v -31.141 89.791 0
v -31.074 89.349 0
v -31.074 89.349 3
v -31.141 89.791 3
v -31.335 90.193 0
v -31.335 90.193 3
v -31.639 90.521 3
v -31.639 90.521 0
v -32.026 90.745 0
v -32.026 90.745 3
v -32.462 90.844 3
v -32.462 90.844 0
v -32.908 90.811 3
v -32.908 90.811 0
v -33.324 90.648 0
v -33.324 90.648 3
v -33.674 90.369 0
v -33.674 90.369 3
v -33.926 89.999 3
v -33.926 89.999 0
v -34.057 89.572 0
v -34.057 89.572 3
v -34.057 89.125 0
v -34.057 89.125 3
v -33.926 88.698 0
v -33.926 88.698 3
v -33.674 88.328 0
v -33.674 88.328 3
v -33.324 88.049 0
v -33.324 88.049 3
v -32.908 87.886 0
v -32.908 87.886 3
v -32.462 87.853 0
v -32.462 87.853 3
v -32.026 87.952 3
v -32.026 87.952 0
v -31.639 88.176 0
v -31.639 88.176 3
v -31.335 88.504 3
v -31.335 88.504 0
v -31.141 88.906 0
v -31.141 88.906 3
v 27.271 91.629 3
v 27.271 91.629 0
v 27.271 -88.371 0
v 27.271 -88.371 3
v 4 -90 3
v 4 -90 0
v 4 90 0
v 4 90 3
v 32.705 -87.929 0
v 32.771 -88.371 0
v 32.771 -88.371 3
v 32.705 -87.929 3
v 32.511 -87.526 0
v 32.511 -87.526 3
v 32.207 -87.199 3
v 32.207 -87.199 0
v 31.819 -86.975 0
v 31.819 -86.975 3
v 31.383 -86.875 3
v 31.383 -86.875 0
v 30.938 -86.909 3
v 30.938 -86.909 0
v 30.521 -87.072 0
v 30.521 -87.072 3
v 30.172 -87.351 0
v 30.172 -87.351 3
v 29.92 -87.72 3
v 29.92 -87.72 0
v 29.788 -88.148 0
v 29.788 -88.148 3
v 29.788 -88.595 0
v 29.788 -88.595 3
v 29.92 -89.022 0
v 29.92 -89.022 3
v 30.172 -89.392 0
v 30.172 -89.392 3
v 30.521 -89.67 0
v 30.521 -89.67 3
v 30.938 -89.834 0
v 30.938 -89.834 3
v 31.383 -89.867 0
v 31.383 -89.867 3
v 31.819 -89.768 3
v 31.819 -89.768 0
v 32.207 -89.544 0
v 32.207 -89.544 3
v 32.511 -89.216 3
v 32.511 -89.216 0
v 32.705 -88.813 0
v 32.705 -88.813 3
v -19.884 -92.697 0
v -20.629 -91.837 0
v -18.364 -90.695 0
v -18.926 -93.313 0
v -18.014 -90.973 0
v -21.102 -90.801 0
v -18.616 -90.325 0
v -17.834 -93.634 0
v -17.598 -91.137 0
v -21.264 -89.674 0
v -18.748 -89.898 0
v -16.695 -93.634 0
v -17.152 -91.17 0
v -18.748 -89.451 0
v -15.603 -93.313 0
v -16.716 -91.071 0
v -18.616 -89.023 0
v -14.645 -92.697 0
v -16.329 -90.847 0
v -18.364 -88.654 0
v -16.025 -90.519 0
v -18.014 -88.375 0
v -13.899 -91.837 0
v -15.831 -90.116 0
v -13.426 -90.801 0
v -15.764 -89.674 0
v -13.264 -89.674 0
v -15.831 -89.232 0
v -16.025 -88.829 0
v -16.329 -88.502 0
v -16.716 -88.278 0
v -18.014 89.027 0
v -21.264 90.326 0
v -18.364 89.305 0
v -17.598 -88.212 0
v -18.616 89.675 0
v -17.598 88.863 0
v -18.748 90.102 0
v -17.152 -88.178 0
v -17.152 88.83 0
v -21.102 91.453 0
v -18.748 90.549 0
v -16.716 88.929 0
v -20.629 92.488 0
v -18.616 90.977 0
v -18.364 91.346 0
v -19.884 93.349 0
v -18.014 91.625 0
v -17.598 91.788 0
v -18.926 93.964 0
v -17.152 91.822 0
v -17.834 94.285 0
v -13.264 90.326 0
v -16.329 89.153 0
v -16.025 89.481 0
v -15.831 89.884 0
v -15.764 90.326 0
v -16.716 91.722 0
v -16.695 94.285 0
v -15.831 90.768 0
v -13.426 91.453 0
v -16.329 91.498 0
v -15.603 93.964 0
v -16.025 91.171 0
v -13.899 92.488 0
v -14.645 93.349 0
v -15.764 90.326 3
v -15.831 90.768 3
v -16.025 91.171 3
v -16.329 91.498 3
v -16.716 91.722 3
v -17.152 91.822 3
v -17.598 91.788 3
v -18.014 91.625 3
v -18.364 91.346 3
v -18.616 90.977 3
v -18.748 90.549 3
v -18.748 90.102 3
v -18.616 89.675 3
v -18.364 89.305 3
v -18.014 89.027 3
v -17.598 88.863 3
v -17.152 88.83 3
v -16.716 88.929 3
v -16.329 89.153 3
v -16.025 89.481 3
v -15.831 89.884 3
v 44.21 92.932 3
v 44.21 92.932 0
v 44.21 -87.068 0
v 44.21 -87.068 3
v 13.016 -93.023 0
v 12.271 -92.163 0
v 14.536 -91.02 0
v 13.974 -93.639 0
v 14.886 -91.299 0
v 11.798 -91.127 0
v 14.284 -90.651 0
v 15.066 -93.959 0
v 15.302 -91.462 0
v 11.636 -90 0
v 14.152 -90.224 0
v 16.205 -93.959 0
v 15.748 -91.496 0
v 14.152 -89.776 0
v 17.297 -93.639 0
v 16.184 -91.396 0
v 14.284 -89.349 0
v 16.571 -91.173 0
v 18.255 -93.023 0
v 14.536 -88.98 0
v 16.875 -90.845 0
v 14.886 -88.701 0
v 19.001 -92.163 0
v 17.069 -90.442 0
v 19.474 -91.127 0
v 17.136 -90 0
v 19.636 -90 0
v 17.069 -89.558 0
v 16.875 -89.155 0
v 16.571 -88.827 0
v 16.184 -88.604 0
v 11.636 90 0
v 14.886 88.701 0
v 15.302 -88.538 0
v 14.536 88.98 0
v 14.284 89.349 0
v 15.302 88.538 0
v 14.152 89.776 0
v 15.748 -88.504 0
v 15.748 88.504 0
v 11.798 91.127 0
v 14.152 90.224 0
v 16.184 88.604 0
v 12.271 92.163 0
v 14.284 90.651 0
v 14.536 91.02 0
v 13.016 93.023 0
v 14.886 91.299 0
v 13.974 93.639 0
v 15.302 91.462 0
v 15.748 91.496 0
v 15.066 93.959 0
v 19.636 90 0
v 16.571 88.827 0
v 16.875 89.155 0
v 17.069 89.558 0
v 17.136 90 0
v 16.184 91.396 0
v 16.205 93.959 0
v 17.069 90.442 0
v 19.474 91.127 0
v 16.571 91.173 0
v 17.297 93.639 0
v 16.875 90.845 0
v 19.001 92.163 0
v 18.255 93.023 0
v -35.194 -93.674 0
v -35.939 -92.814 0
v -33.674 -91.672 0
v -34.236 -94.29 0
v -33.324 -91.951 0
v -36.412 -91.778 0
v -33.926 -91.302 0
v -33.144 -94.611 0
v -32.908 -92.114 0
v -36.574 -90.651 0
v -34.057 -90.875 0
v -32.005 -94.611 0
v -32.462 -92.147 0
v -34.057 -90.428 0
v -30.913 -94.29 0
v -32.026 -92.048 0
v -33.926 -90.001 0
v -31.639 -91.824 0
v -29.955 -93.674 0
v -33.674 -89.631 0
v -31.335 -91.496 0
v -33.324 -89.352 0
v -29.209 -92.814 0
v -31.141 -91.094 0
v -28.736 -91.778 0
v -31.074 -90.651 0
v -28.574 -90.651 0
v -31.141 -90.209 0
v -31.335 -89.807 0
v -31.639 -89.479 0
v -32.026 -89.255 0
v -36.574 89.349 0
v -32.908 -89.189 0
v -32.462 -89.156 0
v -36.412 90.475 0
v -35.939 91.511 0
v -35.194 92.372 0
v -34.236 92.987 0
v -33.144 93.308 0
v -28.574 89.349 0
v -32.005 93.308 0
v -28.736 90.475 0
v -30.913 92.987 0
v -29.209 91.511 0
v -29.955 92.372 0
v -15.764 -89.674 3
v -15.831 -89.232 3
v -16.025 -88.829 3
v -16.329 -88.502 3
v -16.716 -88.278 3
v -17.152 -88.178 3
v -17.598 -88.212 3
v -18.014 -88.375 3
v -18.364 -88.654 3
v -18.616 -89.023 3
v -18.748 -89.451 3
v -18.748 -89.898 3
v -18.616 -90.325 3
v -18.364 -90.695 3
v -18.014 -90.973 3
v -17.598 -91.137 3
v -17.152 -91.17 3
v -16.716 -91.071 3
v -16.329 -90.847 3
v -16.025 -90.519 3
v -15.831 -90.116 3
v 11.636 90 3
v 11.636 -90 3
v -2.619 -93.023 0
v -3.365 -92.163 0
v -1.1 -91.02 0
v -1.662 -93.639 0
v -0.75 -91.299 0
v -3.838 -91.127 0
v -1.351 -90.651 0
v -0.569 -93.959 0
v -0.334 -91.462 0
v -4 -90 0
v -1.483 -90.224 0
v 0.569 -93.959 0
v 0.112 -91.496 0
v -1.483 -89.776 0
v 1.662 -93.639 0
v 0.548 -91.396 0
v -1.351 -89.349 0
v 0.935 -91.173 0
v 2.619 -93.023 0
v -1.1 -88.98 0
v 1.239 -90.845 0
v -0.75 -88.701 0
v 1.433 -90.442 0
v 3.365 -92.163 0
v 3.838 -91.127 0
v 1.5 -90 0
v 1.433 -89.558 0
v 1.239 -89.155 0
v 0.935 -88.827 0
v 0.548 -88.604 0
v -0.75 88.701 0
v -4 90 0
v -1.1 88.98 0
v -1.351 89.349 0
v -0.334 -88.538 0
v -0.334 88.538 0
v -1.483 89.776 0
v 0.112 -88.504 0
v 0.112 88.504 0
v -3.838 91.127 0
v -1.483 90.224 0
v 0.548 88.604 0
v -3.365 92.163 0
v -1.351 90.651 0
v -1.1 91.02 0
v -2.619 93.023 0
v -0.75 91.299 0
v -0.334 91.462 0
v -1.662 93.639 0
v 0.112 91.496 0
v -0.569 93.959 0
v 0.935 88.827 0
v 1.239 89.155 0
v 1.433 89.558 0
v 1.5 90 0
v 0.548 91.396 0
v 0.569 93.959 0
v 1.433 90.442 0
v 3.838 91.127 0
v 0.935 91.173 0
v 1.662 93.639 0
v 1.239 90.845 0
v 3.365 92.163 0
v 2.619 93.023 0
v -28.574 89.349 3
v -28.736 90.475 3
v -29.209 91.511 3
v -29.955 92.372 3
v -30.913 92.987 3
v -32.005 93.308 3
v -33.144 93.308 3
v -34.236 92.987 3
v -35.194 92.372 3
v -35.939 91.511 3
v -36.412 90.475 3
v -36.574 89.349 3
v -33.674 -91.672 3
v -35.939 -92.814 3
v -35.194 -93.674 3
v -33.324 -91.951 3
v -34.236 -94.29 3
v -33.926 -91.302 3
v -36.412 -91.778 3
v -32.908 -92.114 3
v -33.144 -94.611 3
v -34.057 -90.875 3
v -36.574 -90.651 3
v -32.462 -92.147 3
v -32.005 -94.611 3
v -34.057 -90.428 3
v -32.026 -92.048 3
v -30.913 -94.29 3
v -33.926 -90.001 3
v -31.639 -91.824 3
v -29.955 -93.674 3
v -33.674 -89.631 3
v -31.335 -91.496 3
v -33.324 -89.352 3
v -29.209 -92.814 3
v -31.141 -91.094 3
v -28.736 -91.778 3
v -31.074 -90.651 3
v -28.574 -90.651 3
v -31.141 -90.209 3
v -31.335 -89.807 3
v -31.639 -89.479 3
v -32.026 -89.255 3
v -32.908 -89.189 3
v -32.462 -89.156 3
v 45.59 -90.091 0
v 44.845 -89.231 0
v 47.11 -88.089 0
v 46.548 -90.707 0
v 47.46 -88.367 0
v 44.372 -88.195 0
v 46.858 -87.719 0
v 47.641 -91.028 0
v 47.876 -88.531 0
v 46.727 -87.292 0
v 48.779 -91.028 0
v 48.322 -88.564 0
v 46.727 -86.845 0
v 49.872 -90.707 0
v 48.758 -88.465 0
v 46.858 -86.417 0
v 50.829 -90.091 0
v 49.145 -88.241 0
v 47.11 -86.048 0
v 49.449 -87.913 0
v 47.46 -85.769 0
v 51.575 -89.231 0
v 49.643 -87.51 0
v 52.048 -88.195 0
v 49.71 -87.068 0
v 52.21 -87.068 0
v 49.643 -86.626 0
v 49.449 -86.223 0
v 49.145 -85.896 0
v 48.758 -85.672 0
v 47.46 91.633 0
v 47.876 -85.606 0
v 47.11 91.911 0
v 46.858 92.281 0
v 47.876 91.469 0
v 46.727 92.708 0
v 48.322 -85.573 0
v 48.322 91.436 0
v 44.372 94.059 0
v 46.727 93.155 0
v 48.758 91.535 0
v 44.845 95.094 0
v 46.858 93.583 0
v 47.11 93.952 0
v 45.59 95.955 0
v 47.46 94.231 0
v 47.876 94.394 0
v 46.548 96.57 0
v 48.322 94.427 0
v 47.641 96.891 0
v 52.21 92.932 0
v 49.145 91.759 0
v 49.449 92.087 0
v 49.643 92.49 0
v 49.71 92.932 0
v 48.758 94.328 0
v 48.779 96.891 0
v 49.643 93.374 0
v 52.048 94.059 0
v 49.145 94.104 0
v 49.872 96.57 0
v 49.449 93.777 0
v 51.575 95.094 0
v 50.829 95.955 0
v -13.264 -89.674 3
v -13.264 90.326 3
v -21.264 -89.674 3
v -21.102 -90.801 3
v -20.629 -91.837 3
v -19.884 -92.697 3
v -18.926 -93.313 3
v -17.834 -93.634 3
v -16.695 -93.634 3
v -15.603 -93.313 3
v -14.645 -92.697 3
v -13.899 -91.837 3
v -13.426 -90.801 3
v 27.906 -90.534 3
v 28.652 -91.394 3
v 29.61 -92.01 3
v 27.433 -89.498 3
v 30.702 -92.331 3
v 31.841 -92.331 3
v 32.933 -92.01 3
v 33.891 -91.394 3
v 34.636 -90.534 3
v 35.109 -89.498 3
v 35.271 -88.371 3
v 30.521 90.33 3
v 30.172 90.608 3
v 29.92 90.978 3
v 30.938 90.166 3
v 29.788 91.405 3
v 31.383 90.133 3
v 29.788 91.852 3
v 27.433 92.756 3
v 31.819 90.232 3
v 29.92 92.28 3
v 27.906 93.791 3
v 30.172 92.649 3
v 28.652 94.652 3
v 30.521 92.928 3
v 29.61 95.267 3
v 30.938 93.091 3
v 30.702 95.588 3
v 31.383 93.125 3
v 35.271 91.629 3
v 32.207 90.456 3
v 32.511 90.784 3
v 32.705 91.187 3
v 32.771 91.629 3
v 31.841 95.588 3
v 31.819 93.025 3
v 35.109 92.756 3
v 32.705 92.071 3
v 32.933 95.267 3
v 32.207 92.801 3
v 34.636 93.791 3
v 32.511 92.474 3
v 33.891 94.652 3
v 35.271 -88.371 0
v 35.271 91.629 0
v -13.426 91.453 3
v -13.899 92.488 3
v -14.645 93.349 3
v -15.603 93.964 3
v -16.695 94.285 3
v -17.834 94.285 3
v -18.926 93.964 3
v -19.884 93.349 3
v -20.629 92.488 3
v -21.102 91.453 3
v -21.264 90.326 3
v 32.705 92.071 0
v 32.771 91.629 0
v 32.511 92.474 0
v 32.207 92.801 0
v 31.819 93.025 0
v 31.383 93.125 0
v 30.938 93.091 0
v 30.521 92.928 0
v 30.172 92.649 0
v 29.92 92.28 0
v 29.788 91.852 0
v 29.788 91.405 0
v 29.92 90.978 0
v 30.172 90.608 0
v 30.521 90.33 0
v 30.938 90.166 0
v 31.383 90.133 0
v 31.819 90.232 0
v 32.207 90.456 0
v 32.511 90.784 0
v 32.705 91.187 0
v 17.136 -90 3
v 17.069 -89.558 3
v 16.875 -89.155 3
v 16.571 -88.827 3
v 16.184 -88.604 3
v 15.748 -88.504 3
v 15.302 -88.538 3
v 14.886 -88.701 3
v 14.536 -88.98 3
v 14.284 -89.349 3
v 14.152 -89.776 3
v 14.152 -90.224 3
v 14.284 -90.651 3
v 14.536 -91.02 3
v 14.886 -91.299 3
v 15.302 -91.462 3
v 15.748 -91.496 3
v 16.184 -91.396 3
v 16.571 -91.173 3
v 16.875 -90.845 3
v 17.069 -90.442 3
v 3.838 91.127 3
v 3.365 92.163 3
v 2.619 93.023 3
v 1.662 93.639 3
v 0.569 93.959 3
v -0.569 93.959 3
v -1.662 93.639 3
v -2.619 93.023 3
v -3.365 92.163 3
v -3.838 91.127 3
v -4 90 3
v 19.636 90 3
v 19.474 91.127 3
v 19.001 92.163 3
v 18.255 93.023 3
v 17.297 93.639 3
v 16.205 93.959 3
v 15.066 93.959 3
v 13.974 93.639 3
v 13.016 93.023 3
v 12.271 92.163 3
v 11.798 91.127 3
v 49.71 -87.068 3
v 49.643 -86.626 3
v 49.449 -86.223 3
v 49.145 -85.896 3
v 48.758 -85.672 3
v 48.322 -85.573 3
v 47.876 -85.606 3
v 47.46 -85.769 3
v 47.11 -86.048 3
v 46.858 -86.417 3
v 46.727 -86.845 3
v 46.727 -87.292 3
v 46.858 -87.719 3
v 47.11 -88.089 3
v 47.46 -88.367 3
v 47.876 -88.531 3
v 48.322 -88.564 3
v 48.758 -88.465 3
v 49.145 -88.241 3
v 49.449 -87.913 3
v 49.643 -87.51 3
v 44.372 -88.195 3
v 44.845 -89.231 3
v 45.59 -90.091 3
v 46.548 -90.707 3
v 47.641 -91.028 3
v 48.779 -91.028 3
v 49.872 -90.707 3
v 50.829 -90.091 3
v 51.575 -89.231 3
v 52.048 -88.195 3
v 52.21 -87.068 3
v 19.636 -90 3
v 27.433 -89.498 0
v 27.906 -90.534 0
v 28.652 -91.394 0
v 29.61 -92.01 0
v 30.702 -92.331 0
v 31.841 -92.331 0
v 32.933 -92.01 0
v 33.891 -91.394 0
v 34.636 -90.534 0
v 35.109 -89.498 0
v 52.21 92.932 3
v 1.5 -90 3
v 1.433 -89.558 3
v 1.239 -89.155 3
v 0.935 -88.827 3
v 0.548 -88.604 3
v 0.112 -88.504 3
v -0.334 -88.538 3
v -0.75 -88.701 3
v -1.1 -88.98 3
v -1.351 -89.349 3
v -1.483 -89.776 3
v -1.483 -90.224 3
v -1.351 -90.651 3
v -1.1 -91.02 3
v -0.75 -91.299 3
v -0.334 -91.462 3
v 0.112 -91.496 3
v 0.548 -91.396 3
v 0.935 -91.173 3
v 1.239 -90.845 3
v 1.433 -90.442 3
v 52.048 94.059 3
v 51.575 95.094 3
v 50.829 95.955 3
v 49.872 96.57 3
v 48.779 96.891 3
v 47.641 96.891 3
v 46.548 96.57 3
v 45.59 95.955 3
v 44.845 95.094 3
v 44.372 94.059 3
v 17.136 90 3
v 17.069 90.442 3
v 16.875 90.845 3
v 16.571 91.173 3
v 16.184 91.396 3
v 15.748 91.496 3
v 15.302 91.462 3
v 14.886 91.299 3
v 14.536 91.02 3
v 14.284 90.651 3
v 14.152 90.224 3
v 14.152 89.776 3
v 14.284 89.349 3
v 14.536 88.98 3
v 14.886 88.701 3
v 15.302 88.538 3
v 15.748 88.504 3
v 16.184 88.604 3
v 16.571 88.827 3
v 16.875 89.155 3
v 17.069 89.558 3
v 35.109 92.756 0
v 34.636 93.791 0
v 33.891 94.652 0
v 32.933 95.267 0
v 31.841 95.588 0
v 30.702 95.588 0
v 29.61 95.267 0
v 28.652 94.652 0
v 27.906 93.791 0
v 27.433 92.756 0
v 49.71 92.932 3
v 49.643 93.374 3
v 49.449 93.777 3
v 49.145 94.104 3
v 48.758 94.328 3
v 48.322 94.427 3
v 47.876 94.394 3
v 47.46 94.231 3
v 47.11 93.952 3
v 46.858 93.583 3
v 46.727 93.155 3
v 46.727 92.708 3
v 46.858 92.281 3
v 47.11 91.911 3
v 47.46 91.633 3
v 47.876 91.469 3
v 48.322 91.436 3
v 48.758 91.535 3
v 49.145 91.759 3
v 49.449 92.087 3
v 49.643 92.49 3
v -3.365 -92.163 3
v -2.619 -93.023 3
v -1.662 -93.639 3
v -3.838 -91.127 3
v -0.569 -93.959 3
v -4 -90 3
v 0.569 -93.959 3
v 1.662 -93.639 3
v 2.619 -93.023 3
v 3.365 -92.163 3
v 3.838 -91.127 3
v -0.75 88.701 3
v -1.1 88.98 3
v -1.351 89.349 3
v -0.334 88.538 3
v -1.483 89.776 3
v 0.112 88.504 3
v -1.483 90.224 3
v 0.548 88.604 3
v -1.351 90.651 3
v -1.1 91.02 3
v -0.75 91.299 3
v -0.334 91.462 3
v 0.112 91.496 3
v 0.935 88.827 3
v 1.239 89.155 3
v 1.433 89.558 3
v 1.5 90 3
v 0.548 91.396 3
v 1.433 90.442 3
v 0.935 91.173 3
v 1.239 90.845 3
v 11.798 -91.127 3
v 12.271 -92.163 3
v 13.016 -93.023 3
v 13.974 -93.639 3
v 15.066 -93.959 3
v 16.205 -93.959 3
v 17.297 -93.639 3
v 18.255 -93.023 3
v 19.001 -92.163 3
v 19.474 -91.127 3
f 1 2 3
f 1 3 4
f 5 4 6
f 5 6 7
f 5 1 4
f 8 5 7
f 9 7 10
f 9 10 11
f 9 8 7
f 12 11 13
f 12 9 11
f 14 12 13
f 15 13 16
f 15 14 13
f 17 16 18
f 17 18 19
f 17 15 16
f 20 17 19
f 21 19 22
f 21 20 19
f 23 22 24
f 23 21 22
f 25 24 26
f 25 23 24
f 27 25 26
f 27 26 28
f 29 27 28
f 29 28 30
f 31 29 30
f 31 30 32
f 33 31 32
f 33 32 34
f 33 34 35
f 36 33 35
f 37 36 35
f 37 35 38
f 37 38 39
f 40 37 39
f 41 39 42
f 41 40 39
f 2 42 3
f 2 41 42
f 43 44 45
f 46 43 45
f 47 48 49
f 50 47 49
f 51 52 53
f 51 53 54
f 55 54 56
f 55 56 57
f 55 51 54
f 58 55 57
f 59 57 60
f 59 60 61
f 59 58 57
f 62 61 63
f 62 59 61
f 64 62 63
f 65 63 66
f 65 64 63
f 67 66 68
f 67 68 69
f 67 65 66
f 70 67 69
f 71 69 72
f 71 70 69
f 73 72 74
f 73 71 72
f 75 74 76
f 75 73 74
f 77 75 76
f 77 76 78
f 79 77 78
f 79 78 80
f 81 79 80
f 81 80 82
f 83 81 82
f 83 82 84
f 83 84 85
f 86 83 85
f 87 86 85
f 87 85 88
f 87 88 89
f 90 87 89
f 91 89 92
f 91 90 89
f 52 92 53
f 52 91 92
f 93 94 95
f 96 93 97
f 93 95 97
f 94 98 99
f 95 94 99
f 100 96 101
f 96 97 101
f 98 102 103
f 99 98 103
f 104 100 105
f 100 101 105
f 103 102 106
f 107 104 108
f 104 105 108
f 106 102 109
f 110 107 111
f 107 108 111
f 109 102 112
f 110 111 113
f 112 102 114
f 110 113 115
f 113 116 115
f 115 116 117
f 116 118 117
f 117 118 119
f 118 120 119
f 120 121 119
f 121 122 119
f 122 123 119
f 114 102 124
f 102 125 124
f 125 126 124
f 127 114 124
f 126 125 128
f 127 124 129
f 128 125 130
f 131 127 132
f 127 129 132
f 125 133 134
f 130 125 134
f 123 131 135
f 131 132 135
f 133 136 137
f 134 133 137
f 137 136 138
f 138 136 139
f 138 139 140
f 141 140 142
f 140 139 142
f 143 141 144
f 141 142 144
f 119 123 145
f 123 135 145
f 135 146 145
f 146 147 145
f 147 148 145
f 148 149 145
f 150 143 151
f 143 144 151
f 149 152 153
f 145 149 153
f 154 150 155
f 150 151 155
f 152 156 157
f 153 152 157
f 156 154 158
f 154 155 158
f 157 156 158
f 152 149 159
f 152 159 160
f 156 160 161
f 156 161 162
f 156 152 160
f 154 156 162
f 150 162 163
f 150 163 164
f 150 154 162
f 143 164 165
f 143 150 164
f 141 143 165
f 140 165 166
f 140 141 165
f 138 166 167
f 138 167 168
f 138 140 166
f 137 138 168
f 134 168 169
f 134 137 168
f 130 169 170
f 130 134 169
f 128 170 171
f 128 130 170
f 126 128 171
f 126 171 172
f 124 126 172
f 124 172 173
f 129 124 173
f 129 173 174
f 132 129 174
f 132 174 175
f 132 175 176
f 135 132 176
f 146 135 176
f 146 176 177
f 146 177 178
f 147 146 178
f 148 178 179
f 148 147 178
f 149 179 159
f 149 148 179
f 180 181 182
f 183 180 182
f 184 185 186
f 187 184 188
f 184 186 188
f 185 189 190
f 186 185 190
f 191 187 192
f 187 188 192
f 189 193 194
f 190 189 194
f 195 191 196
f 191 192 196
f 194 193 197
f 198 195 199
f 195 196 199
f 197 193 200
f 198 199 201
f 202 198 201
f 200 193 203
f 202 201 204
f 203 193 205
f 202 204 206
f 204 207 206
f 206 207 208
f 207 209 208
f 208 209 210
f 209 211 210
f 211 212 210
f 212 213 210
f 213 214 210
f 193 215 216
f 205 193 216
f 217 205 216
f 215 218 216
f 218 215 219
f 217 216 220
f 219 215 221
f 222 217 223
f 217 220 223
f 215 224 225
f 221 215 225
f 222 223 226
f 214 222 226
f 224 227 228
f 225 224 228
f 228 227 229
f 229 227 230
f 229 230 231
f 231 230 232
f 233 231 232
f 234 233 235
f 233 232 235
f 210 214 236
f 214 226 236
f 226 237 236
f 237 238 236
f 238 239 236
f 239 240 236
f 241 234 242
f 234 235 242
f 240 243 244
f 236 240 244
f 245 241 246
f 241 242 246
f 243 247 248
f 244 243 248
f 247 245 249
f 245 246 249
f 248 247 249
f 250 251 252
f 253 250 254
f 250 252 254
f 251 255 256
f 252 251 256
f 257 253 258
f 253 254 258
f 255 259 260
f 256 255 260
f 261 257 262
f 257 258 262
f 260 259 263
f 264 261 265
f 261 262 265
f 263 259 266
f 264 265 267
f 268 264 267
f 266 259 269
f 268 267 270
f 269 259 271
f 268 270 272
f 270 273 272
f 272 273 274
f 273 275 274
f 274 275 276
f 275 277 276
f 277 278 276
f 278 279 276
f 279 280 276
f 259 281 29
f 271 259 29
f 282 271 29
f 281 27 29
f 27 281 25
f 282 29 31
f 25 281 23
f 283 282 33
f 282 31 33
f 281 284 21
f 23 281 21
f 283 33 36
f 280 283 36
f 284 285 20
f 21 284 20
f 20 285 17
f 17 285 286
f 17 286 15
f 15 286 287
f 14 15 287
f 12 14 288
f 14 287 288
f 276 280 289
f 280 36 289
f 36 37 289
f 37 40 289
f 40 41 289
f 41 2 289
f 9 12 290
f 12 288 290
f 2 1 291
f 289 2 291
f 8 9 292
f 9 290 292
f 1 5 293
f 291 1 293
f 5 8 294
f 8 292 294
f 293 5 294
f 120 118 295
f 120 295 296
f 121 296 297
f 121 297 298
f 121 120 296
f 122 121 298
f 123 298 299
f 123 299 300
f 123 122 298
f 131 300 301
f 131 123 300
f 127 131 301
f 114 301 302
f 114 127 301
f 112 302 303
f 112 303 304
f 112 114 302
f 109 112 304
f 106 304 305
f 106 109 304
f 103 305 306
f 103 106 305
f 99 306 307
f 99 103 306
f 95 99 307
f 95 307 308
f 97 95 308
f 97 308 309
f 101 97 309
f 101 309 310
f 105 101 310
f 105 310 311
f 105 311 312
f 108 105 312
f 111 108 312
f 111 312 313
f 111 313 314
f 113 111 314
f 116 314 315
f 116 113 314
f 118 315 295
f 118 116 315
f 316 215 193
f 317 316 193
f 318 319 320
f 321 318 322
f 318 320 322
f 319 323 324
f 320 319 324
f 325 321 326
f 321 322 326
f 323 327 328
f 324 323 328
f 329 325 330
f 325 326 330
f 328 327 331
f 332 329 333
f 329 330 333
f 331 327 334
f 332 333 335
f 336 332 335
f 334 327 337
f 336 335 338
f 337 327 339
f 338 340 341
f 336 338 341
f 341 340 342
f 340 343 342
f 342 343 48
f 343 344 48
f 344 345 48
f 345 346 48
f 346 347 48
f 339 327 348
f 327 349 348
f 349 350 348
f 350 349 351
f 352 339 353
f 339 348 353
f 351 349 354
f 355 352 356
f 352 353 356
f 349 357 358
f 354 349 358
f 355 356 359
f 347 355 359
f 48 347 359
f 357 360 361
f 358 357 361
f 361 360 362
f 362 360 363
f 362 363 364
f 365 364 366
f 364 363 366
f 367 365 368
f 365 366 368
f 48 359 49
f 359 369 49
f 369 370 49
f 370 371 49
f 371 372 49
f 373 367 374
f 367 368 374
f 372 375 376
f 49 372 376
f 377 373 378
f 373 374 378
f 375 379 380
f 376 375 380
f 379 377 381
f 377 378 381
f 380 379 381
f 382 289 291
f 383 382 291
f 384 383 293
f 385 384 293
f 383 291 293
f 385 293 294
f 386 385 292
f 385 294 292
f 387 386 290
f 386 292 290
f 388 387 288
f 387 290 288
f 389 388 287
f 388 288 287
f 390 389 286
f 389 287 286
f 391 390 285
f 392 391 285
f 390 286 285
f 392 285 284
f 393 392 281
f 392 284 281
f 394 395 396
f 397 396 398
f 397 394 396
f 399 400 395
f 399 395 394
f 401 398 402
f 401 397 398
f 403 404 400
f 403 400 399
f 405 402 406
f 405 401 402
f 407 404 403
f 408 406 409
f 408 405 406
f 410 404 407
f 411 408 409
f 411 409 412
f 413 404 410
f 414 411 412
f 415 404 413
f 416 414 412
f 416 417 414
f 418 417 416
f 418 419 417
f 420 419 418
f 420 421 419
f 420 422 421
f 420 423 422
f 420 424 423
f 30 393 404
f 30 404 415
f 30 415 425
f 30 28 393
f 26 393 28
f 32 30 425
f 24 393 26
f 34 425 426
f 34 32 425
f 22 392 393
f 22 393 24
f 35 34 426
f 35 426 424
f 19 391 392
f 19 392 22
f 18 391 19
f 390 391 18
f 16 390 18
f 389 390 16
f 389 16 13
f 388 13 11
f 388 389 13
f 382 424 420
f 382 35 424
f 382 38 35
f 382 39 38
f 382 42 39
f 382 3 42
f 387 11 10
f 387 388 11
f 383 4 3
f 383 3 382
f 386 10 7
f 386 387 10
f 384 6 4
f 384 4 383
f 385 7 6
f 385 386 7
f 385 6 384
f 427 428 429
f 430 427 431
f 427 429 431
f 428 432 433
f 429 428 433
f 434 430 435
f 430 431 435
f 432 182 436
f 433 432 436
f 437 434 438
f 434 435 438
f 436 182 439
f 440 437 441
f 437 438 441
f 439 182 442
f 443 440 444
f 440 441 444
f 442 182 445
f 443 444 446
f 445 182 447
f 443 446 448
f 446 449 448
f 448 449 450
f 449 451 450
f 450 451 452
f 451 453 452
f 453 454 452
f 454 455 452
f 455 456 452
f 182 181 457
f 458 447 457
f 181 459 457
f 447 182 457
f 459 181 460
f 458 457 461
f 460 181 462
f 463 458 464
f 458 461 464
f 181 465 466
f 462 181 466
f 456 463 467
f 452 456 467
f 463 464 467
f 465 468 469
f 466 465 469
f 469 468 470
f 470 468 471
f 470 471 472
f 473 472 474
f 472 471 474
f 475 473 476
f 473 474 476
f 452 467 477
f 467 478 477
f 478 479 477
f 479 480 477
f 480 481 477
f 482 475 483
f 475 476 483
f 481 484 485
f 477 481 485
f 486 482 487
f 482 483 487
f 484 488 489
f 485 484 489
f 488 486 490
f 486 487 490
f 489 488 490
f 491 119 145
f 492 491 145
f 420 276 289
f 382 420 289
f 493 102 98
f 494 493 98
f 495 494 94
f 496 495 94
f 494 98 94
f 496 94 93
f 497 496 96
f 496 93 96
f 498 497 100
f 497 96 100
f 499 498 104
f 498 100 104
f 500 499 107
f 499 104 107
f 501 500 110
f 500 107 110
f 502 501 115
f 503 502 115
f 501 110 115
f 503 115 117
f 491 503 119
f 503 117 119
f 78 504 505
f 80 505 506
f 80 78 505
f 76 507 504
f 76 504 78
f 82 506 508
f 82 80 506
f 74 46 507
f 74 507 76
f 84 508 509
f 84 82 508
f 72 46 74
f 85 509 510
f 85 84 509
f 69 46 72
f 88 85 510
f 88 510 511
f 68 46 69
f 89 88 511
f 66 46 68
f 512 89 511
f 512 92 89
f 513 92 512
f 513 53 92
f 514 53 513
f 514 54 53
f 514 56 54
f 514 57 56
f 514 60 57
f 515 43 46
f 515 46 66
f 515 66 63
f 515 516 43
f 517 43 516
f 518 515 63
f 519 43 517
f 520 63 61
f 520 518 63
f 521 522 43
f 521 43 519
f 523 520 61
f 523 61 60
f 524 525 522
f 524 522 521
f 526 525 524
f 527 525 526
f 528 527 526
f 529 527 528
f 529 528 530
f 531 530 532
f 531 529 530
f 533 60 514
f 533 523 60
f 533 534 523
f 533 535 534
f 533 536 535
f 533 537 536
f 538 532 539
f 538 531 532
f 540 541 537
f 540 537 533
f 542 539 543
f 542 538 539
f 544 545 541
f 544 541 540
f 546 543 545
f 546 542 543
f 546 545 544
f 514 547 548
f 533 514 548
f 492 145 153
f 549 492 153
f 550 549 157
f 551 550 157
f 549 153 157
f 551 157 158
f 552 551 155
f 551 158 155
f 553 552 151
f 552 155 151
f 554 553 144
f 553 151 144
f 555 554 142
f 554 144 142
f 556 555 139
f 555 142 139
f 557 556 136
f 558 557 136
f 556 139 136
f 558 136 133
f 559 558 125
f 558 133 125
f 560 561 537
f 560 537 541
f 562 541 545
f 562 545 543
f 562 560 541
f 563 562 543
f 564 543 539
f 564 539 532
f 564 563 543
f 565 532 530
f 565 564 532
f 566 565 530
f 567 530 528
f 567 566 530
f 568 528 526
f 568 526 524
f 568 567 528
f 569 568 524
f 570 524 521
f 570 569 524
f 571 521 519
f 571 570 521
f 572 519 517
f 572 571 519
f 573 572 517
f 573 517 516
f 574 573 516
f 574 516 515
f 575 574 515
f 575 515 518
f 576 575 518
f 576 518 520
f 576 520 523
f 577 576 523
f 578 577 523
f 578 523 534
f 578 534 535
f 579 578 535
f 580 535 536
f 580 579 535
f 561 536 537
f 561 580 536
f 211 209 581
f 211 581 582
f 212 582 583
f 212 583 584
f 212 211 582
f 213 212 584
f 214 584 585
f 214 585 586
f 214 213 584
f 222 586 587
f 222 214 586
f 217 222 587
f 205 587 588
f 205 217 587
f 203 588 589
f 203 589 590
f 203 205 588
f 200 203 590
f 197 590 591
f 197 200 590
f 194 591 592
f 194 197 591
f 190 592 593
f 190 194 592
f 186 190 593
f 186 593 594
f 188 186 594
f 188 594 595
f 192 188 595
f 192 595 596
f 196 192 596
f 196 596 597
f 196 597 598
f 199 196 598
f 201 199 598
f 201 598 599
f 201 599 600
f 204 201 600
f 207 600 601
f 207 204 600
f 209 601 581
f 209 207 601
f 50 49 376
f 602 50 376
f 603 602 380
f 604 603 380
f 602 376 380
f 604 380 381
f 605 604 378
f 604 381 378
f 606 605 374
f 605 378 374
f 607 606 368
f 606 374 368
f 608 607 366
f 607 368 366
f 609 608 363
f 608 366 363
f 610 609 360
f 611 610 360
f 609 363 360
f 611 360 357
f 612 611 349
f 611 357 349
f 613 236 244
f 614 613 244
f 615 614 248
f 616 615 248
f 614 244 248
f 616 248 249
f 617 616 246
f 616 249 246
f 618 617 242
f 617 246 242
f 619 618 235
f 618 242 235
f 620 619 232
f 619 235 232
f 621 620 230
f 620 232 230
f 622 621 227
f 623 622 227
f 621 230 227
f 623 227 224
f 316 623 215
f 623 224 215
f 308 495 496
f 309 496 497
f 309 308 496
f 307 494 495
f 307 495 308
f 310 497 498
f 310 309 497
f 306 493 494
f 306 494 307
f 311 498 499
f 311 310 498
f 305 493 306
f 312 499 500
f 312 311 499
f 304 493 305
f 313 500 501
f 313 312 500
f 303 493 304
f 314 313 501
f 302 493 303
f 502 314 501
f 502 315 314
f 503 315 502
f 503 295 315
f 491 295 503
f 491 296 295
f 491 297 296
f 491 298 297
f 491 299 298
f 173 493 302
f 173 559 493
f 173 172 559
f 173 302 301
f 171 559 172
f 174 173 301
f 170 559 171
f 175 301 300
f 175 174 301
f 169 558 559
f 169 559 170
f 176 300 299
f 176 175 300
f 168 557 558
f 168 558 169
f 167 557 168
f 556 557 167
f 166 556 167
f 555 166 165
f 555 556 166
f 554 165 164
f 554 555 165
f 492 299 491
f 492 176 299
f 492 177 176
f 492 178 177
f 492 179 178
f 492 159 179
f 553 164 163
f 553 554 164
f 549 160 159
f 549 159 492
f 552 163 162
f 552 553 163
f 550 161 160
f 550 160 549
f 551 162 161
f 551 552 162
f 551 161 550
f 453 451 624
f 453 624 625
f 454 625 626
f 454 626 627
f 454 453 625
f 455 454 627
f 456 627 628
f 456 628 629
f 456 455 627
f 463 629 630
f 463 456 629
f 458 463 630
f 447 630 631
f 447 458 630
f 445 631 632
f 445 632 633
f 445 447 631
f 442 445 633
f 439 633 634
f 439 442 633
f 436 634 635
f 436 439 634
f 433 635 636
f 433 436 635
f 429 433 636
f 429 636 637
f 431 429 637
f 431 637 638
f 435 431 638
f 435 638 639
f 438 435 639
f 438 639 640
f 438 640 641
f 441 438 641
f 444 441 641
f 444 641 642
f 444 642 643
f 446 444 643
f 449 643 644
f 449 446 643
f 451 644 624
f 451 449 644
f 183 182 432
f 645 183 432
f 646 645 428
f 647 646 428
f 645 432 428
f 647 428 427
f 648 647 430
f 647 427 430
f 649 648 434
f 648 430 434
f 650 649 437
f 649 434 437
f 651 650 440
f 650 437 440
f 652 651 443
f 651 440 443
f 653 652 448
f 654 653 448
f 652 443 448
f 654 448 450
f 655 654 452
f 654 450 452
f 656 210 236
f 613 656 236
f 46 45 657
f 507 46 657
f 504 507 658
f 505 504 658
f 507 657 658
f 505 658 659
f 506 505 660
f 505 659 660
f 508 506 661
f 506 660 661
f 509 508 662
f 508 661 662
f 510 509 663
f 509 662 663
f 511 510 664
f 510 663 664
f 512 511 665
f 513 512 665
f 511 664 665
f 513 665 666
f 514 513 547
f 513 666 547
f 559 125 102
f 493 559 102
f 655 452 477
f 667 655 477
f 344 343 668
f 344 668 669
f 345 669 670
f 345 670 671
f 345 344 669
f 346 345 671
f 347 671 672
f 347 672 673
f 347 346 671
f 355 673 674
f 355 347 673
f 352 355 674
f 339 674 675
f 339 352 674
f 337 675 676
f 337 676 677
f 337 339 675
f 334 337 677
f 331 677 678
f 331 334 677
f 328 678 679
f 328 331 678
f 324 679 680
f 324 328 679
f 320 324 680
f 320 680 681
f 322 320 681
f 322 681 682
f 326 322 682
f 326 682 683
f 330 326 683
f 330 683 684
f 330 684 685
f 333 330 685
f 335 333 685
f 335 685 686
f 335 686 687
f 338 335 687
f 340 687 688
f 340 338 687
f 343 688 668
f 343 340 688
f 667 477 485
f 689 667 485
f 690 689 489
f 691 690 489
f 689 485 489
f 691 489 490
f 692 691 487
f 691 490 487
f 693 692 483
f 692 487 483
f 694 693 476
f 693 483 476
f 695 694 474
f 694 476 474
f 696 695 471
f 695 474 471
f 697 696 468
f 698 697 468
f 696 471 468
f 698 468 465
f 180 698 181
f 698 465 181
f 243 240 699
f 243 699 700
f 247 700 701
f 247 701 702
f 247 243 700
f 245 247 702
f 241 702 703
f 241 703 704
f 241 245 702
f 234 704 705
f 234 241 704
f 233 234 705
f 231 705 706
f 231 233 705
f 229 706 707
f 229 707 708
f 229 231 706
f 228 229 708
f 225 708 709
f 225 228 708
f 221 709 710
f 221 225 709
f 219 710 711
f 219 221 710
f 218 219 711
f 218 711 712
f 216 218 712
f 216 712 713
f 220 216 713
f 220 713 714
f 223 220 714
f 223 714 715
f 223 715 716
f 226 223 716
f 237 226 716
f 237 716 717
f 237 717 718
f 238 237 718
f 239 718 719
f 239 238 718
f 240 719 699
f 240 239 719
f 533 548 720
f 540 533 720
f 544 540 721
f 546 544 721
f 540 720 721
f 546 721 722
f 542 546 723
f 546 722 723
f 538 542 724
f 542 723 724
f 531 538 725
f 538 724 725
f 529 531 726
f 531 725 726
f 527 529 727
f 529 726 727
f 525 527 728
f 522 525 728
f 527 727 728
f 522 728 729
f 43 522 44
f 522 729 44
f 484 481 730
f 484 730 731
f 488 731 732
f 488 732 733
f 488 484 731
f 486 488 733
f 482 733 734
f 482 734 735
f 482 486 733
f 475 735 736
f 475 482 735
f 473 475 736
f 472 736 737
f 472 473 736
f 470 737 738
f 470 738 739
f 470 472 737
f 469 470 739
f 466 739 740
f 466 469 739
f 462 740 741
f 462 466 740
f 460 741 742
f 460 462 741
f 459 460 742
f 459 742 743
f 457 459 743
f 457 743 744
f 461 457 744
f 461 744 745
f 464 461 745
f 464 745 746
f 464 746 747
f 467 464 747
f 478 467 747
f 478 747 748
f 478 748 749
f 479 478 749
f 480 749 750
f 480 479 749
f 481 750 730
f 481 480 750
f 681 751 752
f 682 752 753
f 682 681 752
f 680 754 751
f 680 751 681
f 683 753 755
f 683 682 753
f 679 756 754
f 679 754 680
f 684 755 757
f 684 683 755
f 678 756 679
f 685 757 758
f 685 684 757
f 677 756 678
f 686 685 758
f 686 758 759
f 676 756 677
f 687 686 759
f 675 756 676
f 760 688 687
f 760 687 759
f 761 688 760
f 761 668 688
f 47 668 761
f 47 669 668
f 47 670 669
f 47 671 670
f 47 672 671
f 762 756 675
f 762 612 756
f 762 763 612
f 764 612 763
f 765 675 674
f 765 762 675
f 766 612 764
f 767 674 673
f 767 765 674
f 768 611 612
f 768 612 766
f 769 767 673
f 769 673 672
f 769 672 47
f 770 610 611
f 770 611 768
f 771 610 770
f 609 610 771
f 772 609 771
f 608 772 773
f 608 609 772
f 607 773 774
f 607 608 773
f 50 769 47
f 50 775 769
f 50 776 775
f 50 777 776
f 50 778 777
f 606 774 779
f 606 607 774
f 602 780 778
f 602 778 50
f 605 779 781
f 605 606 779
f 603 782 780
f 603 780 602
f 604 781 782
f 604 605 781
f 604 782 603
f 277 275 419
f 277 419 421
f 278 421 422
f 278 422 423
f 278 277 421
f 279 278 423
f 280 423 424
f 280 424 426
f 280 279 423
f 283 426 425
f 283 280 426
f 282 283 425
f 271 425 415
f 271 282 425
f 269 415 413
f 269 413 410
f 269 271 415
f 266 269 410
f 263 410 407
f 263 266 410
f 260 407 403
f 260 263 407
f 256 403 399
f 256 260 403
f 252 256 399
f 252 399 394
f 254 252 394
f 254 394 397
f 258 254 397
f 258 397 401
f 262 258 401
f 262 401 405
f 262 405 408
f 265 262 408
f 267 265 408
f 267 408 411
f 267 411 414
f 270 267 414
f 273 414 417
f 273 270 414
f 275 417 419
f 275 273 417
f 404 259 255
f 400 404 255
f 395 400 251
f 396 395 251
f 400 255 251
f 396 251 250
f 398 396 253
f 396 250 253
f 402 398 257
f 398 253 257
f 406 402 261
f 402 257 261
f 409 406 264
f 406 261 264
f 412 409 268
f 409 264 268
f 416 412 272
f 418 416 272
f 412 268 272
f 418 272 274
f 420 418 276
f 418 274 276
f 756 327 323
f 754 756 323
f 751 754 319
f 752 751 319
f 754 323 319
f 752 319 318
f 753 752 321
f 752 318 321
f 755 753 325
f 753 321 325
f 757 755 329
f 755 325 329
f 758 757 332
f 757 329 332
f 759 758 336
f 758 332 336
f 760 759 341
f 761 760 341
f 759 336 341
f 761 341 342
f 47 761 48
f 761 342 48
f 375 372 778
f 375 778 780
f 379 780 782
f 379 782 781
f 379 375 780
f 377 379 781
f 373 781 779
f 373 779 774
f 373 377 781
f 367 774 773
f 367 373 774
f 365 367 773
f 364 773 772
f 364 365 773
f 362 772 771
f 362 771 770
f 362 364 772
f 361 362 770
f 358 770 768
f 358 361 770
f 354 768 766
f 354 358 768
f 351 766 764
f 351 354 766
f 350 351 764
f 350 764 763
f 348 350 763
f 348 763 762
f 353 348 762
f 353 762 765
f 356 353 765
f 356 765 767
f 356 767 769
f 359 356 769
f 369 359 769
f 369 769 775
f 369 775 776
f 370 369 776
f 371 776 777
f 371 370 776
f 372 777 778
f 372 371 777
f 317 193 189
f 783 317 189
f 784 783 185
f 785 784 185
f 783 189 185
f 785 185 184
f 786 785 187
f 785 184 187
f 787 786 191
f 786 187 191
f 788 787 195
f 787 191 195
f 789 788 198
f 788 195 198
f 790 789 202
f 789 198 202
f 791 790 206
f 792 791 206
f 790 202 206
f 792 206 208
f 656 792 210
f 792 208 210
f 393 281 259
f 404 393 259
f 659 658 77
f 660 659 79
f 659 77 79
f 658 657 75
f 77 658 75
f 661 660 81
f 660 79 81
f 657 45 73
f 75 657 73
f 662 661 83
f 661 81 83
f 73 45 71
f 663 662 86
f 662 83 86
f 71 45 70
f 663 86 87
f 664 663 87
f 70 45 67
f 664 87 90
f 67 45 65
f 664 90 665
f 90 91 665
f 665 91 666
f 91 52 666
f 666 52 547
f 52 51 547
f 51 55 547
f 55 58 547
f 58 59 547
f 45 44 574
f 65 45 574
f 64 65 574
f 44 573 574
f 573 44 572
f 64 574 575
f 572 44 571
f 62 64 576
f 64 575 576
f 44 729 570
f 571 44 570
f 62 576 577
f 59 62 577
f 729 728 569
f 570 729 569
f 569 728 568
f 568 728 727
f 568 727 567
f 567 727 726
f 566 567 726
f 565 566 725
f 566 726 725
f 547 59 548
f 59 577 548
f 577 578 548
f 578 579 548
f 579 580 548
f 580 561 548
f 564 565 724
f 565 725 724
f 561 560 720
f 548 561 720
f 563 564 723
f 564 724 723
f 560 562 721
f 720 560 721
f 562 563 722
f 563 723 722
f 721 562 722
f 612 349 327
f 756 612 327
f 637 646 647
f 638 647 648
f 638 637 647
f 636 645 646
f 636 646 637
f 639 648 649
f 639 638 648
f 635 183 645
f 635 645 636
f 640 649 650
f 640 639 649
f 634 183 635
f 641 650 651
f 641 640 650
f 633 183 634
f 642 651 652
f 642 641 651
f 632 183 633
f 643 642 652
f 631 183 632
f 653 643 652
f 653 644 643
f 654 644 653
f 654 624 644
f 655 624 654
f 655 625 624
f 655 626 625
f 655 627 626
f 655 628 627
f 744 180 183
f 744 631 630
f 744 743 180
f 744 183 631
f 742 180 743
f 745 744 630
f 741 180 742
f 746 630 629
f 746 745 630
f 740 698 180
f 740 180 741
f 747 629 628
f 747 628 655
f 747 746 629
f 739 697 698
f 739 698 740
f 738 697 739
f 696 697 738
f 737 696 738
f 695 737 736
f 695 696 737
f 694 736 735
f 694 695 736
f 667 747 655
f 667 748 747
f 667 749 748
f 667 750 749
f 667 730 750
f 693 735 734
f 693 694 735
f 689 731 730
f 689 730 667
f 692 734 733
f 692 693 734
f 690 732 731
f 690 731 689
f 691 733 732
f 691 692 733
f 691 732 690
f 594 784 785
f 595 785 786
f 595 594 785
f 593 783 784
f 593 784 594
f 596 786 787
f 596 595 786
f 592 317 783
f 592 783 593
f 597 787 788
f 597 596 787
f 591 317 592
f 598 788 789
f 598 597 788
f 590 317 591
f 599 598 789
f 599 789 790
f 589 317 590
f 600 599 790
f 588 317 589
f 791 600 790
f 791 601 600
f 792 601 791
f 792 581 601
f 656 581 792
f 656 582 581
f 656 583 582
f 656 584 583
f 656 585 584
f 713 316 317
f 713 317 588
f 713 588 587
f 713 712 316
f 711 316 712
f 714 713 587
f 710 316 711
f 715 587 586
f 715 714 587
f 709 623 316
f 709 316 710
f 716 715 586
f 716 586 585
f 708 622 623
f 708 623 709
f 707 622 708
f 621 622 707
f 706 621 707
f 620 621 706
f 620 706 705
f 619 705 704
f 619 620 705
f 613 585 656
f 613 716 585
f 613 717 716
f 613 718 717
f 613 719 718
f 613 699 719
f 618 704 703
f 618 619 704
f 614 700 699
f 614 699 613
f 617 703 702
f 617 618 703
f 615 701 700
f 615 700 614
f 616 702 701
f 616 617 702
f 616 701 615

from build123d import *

# Parameters (mm, degrees)
F0_R     = 1.5
F1_DEPTH = 3


with BuildPart() as f1:
    # F0 (on Top) → F1 (new body)
    with BuildSketch(Plane.XY):
        with BuildLine():
            Line((-28.574253, -90.651485), (-28.574253, 89.348515))
            ThreePointArc((-28.574253, 89.348515), (-32.574253, 93.348515), (-36.574253, 89.348515))
            Line((-36.574253, 89.348515), (-36.574253, -90.651485))
            ThreePointArc((-36.574253, -90.651485), (-32.574253, -94.651485), (-28.574253, -90.651485))
        make_face()
        with Locations((-32.574253, -90.651485)):
            Circle(F0_R, mode=Mode.SUBTRACT)
        with Locations((-32.574253, 89.348515)):
            Circle(F0_R, mode=Mode.SUBTRACT)
        with BuildLine():
            Line((-13.264356, -89.674257), (-13.264356, 90.325743))
            ThreePointArc((-13.264356, 90.325743), (-17.264356, 94.325743), (-21.264356, 90.325743))
            Line((-21.264356, 90.325743), (-21.264356, -89.674257))
            ThreePointArc((-21.264356, -89.674257), (-17.264356, -93.674257), (-13.264356, -89.674257))
        make_face()
        with Locations((-17.264356, -89.674257)):
            Circle(F0_R, mode=Mode.SUBTRACT)
        with Locations((-17.264356, 90.325743)):
            Circle(F0_R, mode=Mode.SUBTRACT)
        with BuildLine():
            Line((4, -90), (4, 90))
            ThreePointArc((4, 90), (0, 94), (-4, 90))
            Line((-4, 90), (-4, -90))
            ThreePointArc((-4, -90), (0, -94), (4, -90))
        make_face()
        with Locations((0, -90)):
            Circle(F0_R, mode=Mode.SUBTRACT)
        with Locations((0, 90)):
            Circle(F0_R, mode=Mode.SUBTRACT)
        with BuildLine():
            Line((19.635641, -90), (19.635641, 90))
            ThreePointArc((19.635641, 90), (15.635641, 94), (11.635641, 90))
            Line((11.635641, 90), (11.635641, -90))
            ThreePointArc((11.635641, -90), (15.635641, -94), (19.635641, -90))
        make_face()
        with Locations((15.635641, -90)):
            Circle(F0_R, mode=Mode.SUBTRACT)
        with Locations((15.635641, 90)):
            Circle(F0_R, mode=Mode.SUBTRACT)
        with BuildLine():
            Line((35.271284, -88.371287), (35.271284, 91.628713))
            ThreePointArc((35.271284, 91.628713), (31.271284, 95.628713), (27.271284, 91.628713))
            Line((27.271284, 91.628713), (27.271284, -88.371287))
            ThreePointArc((27.271284, -88.371287), (31.271284, -92.371287), (35.271284, -88.371287))
        make_face()
        with Locations((31.271284, -88.371287)):
            Circle(F0_R, mode=Mode.SUBTRACT)
        with Locations((31.271284, 91.628713)):
            Circle(F0_R, mode=Mode.SUBTRACT)
        with BuildLine():
            Line((52.209906, -87.068317), (52.209906, 92.931683))
            ThreePointArc((52.209906, 92.931683), (48.209906, 96.931683), (44.209906, 92.931683))
            Line((44.209906, 92.931683), (44.209906, -87.068317))
            ThreePointArc((44.209906, -87.068317), (48.209906, -91.068317), (52.209906, -87.068317))
        make_face()
        with Locations((48.209906, -87.068317)):
            Circle(F0_R, mode=Mode.SUBTRACT)
        with Locations((48.209906, 92.931683)):
            Circle(F0_R, mode=Mode.SUBTRACT)
    extrude(amount=F1_DEPTH)


solid = f1.part
